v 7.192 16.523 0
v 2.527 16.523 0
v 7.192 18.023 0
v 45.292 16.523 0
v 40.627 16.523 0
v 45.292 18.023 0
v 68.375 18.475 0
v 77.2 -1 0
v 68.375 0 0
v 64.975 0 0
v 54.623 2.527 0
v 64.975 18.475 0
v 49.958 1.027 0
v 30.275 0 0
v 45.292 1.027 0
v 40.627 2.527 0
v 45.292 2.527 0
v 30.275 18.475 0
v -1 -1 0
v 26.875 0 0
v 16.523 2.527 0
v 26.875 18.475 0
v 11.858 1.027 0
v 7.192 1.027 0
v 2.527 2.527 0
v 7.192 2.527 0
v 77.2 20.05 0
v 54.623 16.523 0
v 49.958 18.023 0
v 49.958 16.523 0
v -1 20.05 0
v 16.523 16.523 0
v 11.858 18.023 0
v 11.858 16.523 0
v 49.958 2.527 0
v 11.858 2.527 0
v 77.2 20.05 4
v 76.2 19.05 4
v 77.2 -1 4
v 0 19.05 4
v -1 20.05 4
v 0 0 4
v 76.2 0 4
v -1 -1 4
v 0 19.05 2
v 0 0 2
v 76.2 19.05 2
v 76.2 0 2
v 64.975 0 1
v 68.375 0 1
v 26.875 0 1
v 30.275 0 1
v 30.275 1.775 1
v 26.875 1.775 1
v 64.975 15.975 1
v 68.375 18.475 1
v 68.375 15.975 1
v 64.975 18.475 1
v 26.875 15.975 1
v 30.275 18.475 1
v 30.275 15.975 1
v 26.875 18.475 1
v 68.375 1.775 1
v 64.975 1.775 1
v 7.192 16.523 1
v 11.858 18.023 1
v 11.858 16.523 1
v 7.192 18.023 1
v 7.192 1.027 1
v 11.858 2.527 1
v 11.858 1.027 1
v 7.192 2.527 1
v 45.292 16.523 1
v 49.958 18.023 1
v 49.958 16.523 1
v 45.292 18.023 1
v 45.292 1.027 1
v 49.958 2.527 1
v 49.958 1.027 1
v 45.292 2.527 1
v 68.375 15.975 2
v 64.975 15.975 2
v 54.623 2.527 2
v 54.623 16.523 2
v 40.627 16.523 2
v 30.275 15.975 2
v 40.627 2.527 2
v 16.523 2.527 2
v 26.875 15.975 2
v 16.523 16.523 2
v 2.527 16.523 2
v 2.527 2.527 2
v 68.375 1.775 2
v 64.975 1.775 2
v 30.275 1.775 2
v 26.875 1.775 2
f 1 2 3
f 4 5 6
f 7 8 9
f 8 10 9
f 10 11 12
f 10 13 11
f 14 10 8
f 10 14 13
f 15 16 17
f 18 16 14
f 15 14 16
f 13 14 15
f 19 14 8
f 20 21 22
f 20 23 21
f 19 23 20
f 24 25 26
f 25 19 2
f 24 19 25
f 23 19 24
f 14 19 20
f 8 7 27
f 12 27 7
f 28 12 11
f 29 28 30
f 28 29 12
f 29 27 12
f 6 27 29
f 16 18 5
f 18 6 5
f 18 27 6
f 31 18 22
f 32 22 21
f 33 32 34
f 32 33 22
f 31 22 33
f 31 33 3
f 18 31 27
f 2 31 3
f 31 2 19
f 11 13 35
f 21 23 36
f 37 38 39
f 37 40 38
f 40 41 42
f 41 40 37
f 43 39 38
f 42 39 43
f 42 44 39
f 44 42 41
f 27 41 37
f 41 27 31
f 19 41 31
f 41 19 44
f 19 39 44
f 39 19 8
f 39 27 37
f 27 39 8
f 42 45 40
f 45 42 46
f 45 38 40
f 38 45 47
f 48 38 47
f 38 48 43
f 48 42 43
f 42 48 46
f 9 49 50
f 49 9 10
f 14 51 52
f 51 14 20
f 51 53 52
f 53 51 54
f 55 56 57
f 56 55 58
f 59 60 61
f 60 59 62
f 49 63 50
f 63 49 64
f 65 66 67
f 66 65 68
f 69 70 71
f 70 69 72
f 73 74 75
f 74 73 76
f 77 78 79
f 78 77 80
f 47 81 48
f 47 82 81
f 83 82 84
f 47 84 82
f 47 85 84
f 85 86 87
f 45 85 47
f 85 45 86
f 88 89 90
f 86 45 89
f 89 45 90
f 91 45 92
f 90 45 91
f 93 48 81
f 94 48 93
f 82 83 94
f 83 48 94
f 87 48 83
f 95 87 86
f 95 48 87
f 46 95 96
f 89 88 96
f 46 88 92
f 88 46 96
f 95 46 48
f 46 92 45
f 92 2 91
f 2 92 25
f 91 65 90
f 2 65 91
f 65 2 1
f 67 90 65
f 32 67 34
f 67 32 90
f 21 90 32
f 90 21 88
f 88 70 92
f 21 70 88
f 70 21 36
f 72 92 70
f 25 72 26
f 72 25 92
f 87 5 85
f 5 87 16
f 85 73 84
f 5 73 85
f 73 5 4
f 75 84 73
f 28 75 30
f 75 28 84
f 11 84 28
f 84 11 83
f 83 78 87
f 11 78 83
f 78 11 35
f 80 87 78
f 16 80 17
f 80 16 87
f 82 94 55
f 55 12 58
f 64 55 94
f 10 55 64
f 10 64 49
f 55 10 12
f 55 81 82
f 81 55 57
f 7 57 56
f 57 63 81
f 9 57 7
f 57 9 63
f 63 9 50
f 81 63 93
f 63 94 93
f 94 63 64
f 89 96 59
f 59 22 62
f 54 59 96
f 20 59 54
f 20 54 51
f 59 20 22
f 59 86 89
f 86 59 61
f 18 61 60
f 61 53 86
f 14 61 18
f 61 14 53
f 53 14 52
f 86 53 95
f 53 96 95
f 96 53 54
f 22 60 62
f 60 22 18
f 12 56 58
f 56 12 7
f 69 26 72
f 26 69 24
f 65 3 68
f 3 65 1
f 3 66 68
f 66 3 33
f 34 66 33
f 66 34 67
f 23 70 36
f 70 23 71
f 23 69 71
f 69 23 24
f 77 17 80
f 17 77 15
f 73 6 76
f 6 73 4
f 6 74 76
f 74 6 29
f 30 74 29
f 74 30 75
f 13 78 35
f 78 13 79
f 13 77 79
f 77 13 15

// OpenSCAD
// https://media.digikey.com/pdf/Data%20Sheets/Cherry%20PDFs/MX%20Series.pdf

////////////////////////////////////////////////////////////////////////
// micro b panel connector
// Overall width: 25mm
// Max height: 10mm (measured)
// Hole spacing: 18mm (per datasheet adafru.it/3258)
// Mounting screws: #4-40

// Create a void for the panel mount micro USB connector,
// connector pointing towards +Z, mounting holes aligned along X
module panelmicrob_void(d_front, d_back, h_spc = 18, maxh = 12, ovw = 26, h_dia =4.5 ) {
    d_ovl = d_back + d_front;
    // 1. Clearance holes for #4-40 screws, length d_front
    translate([-h_spc/2, 0, -.01])
    cylinder(d=h_dia, h=d_front+.01);
    translate([ h_spc/2, 0, -.01])
    cylinder(d=h_dia, h=d_front+.01);
    // 2. hole for the connector itself est 10x5mm
    translate([ 0, 0, -.01])
    linear_extrude(height=h_dia)
    square([11, 6],center=true);
    
    // 3. Cutout for the thing itself, length d_bac
    translate([0, 0, -d_back])
    linear_extrude(height=d_back)
    hull() {
        translate([-h_spc/2, 0, 0])
        circle(d=maxh);
        translate([ h_spc/2, 0, 0])
        circle(d=maxh);
    }
}
////////////////////////////////////////////////////////////////////////

$fn = 72;

function IN(x) = x * 25.4;

function rest(seq) = [for(i=[1:1:len(seq)-1]) seq[i]];
function reverse(seq) = seq ? concat(reverse(rest(seq)), [seq[0]]) : [];
function isnumber(x) = abs(x) + 1 >= 0;

$layer = 0;

module void_keyswitch() {
    square(IN(.551), center=true);
    if($layer == 1)
    square([IN(.551)/3, IN(.551)+3], center=true);
}

// 1x2, .. 1x2.75: A = .94
// 1x3: A = 1.5
// 1x7: A = 4.5
// 1x8, ..., 10: A = 5.25

$costar_stabilizer_offset_y = -0.65;
$costar_stabilizer_width = 3.3 + .1;
$costar_stabilizer_height = 14.2;
$costar_offset_layer = 5;
// kad uses +-1.65 in X and -6.45+7.75 for costar stabilizers
module void_keyswitch_stabilizer(A, B=0) {
    void_keyswitch();

    for(dx = [-A, A]) {
        translate([-dx, $costar_stabilizer_offset_y]) {
            square([$costar_stabilizer_width, $costar_stabilizer_height+$costar_offset_layer*$layer], center=true);
        }
    }
}

module void_keyswitch_as(N) {
    if(N <= 1.75) void_keyswitch();
    else if(N <= 2.75) void_keyswitch_stabilizer(11.9);
    else if(N <= 3) void_keyswitch_stabilizer(19.05);
    else if(N <= 4) void_keyswitch_stabilizer(28.575);
    else if(N <= 4.5) void_keyswitch_stabilizer(34.671);
    else if(N <= 5.5) void_keyswitch_stabilizer(42.8625);
    else if(N <= 6) void_keyswitch_stabilizer(47.5);
    else if(N <= 6.25) void_keyswitch_stabilizer(50);
    else if(N <= 7) void_keyswitch_stabilizer(50);
    else void_keyswitch_stabilizer(66.75);
}

module keyrow(widths) {
    if(widths) {
        width = widths[0];
        if(width > 0) {
            translate([IN(.375) * width, 0])
            void_keyswitch_as(width);
        }
        translate([IN(.75) * abs(width), 0])
            keyrow(rest(widths));
    }
}

module keyrowsr(rows) {
    if(rows) {
        row = rows[0];
        if(isnumber(row)) {
            translate([0, IN(.75) * row])
            keyrowsr(rest(rows));
        } else {
            translate([0, IN(.375)])
            keyrow(row);
            translate([0, IN(.75)])
            keyrowsr(rest(rows));
        }
    }
}

module keyrows(rows) { keyrowsr(reverse(rows)); }

module cutrows_r(rows, left, ovl) {
    if(rows) {
        row = rows[0];
        height = row[0];
        width = row[1];
        if(left) {
            translate([-IN(.375), -IN(.75)])
            offset(.125) square([width * IN(.75), height * IN(.75)]);
        } else {
            translate([-IN(.375) + width * IN(.75), -IN(.75)])
            offset(.125) square([ovl * IN(.75), height * IN(.75)]);
        }
        translate([0, height*IN(.75)])
        cutrows_r(rest(rows), left, ovl);
    }
}

module cutrows(rows, left=true, ovl=99) { cutrows_r(reverse(rows), left=left, ovl=ovl); }



module layer() {
    difference() {
        square([IN(.75 * $cells_x), IN(.75*$cells_y)]);
        keyrows($layout);
    }
}

$plate_th1 = 1.0;
$plate_th2 = 2.0;
$wall_th = 8;
$num_holes = 6;
$wall = 8;
m3_clearance = 3.6;
m3_counterbore_dia = 5.7;
m3_counterbore_h = 2.5;
m3_threaded_insert = 3;
m2_threaded_insert = 2;
$angle = 3.5;
$min_h = 8;
$floor = 2;

module m3_screw_counterbore(len, counterbore_depth=m3_counterbore_h) {
    cylinder(d=m3_clearance, h=len);
    translate([0,0,len-.01])
    cylinder(d=m3_counterbore_dia, h=counterbore_depth);
}

module m3_threaded_insert(len) {
    translate([0,0,-len+.01])
    cylinder(d=m3_threaded_insert, h=len);
}

module distribute(n, t) {
    echo("distribute", n, t);
    for(i=[0:1:n-1]) {
        translate(t * (i / (n-1))) children();
    }
}

module keeb() {

    translate([0,0,$plate_th2])
    linear_extrude($plate_th1, convexity=36) layer($layer=0);

    linear_extrude($plate_th2, convexity=36) layer($layer=1);

    difference() {
        linear_extrude($wall_th, convexity=2)
        difference() {
        translate([-$wall,-$wall,0])
        square([IN(.75 * $cells_x)+2*$wall, IN(.75*$cells_y)+2*$wall]);
        square([IN(.75 * $cells_x), IN(.75*$cells_y)]);
        }

        translate([-$wall/2, -$wall/2])
        distribute($num_holes, [IN(.75 * $cells_x) + $wall,0,0]) {
            m3_screw_counterbore(4, 8);

            translate([0, IN(.75*$cells_y)+$wall/2])
            translate([0, $wall/2])
            m3_screw_counterbore(4, 8);
        }

        let($stage = 1) children();
    }
}

module slice(left, delta, height=32, center=true) {
    linear_extrude(height, center=center, convexity=12)
    offset(delta=delta)
    cutrows($cut, left=left);
}
// %slice(false, delta=.2);

module divided_keyboard(left=1, right=1) {
    if(left)
    color("#ee7777") intersection() { keeb() children(); slice(true, delta=-.2); }
    if(right)
    color("#7777ee") render() intersection() { keeb() children(); slice(false, delta=-.2); }
}

module base_outline() {
    scale([1, 1/cos($angle), 1])
    difference() {
        translate([-$wall,-$wall,0])
        square([IN(.75 * $cells_x)+2*$wall, IN(.75*$cells_y)+2*$wall]);
        square([IN(.75 * $cells_x), IN(.75*$cells_y)]);
    }
}

module shear_yz(v) {
    multmatrix([ [1, 0, 0, 0],
                 [0, 1, v, 0],
                 [0, 0, 1, 0],
                 [0, 0, 0, 1]])
        children();
}

// construct the base with its bottom flat at Z=0
module base0() {
echo("base0()", "min_h", $min_h);
    render() {
        intersection() {
            rotate([$angle, 0, 0]) {
                translate([0,0,-500])
                cube(1000, center=true);
            }
            shear_yz(-tan($angle))
            translate([0, 0, -$min_h-.001]) {
                max_h = $min_h + sin($angle) * (IN(.85*$cells_y) + 2*$wall);
                linear_extrude(height=max_h, convexity=6) base_outline();

                translate([0,0,-$floor])
                scale([1, 1/cos($angle), 1])
                linear_extrude(height=$floor, convexity=6)
                translate([-$wall,-$wall,0])
                square([IN(.75 * $cells_x)+2*$wall, IN(.75*$cells_y)+2*$wall]);
            }
        }
    }
}

module m2_insert_riser(h, do_void) {
    if(do_void) {
        translate([0,0,-.5])
        cylinder(d=m2_threaded_insert, h=h+2);
    } else {
        cylinder(d=m2_threaded_insert + 3, h=h);
    }
}

module m3_insert_riser(h, do_void) {
    if(do_void) {
        translate([0,0,-.5])
        cylinder(d=m2_threaded_insert, h=h+2);
    } else {
        cylinder(d=m2_threaded_insert + 3, h=h);
    }
}

// put the base with the INTENDED TOP at z=0, slice off the unneeded part,
// add mounting holes for threaded insertts
module base_inplace() {
echo("base_inplace()", "min_h", $min_h);
    difference() {

        intersection()  {
            union() {
                rotate([-$angle, 0, 0]) {
                    difference() {
                        union() {
                            render(convexity=4) base0();
                            let($stage=0) children();
                        }
                        let($stage=1) children();
                    }
                }
                let($stage=2) children();
            }
        }


        let($stage=3) children();

        translate([-$wall/2, -$wall/2])
        distribute($num_holes, [IN(.75 * $cells_x) + $wall,0,0]) {
            color("#ff0000")
            m3_threaded_insert(4);

            translate([0, IN(.75*$cells_y)+$wall/2])
            translate([0, $wall/2])
            color("#ff0000")
            m3_threaded_insert(4);
        }
    }
}

module base() {
    translate([0,0,$min_h])
    rotate([$angle, 0, 0])
    base_inplace() children();
}

module split_base(left, right, frac=.5, inplace=false, delta=.2) {
echo("split_base()", "min_h", $min_h);
    ovl_x = IN(.75 * $cells_x) + 2*$wall;
    if(left) {
        intersection() {
            translate([ovl_x*.25-delta-$wall,0,0])
            cube([ovl_x * frac, 1000, 1000], center=true);
            if(inplace) base_inplace() children(); else base() children();
        }
    }
    if(right) {
        intersection() {
            if(inplace) base_inplace() children(); else base() children();
            translate([ovl_x*.75+delta-$wall,0,0])
            cube([ovl_x * frac, 1000, 1000], center=true);
        }
    }
}

module sixteen() {
    $cells_x = 4;
    $cells_y = 4;
    $layout = [ [1, 1, 1, 1], [1, 1, 1, 1], [1, 1, 1, 1], [1, 1, 1, 1] ];

    children();
}

module minimal() {
    $wall_th = 4;
    $plate_th2 = 1.0;
    $cells_x = 4;
    $cells_y = 1;
    $layout = [ [1, 3 ] ];
    children();
}

module clip_post(zz=2, hh=2) {
    rotate([90,0,0])
    linear_extrude(height=3, center=true, convexity=3)
    polygon([
        [1, 0], 
        [1, hh],
        [0, hh],
        [0, hh+zz],
        [1, hh+1+zz],
        [-1, hh+2+zz],
        [-2, 0]
    ]);
}

module clip_board(xx, yy, zz=2, hh=2) {
    translate([-xx/2, -yy/2]) rotate(45) clip_post(zz, hh);
    translate([ xx/2, -yy/2]) rotate(135) clip_post(zz, hh);
    translate([ xx/2,  yy/2]) rotate(-135) clip_post(zz, hh);
    translate([-xx/2,  yy/2]) rotate(-45) clip_post(zz, hh);
}

module post_board(x, y, h, do_void) {
    translate([-x/2, -y/2]) m2_insert_riser(h, do_void);
    translate([ x/2, -y/2]) m2_insert_riser(h, do_void);
    translate([ x/2,  y/2]) m2_insert_riser(h, do_void);
    translate([-x/2,  y/2]) m2_insert_riser(h, do_void);
}

module clip_seesaw() { clip_board(IN(1.3), IN(0.5)); }
module clip_itsybitsy(hh) { clip_board(IN(1.4), IN(0.7), hh=hh); }
module post_neopixel(h, do_void) {
    translate([IN(-.5), IN(.06)])
    m2_insert_riser(h, do_void);
    translate([IN(.5), IN(.06)])
    m2_insert_riser(h, do_void);
}

minimal() { 
    $wall = 1;
    $num_holes = 0;
    keeb();
    // base_inplace() { }
}
// split_base(true, true, inplace=true);

if(1) {
    translate([-$wall-4, -$wall-4,-32]) {
        %cube([200, 150, .1]);
        translate([201,0,0])
        %cube([199, 150, .1]);
    }
}
